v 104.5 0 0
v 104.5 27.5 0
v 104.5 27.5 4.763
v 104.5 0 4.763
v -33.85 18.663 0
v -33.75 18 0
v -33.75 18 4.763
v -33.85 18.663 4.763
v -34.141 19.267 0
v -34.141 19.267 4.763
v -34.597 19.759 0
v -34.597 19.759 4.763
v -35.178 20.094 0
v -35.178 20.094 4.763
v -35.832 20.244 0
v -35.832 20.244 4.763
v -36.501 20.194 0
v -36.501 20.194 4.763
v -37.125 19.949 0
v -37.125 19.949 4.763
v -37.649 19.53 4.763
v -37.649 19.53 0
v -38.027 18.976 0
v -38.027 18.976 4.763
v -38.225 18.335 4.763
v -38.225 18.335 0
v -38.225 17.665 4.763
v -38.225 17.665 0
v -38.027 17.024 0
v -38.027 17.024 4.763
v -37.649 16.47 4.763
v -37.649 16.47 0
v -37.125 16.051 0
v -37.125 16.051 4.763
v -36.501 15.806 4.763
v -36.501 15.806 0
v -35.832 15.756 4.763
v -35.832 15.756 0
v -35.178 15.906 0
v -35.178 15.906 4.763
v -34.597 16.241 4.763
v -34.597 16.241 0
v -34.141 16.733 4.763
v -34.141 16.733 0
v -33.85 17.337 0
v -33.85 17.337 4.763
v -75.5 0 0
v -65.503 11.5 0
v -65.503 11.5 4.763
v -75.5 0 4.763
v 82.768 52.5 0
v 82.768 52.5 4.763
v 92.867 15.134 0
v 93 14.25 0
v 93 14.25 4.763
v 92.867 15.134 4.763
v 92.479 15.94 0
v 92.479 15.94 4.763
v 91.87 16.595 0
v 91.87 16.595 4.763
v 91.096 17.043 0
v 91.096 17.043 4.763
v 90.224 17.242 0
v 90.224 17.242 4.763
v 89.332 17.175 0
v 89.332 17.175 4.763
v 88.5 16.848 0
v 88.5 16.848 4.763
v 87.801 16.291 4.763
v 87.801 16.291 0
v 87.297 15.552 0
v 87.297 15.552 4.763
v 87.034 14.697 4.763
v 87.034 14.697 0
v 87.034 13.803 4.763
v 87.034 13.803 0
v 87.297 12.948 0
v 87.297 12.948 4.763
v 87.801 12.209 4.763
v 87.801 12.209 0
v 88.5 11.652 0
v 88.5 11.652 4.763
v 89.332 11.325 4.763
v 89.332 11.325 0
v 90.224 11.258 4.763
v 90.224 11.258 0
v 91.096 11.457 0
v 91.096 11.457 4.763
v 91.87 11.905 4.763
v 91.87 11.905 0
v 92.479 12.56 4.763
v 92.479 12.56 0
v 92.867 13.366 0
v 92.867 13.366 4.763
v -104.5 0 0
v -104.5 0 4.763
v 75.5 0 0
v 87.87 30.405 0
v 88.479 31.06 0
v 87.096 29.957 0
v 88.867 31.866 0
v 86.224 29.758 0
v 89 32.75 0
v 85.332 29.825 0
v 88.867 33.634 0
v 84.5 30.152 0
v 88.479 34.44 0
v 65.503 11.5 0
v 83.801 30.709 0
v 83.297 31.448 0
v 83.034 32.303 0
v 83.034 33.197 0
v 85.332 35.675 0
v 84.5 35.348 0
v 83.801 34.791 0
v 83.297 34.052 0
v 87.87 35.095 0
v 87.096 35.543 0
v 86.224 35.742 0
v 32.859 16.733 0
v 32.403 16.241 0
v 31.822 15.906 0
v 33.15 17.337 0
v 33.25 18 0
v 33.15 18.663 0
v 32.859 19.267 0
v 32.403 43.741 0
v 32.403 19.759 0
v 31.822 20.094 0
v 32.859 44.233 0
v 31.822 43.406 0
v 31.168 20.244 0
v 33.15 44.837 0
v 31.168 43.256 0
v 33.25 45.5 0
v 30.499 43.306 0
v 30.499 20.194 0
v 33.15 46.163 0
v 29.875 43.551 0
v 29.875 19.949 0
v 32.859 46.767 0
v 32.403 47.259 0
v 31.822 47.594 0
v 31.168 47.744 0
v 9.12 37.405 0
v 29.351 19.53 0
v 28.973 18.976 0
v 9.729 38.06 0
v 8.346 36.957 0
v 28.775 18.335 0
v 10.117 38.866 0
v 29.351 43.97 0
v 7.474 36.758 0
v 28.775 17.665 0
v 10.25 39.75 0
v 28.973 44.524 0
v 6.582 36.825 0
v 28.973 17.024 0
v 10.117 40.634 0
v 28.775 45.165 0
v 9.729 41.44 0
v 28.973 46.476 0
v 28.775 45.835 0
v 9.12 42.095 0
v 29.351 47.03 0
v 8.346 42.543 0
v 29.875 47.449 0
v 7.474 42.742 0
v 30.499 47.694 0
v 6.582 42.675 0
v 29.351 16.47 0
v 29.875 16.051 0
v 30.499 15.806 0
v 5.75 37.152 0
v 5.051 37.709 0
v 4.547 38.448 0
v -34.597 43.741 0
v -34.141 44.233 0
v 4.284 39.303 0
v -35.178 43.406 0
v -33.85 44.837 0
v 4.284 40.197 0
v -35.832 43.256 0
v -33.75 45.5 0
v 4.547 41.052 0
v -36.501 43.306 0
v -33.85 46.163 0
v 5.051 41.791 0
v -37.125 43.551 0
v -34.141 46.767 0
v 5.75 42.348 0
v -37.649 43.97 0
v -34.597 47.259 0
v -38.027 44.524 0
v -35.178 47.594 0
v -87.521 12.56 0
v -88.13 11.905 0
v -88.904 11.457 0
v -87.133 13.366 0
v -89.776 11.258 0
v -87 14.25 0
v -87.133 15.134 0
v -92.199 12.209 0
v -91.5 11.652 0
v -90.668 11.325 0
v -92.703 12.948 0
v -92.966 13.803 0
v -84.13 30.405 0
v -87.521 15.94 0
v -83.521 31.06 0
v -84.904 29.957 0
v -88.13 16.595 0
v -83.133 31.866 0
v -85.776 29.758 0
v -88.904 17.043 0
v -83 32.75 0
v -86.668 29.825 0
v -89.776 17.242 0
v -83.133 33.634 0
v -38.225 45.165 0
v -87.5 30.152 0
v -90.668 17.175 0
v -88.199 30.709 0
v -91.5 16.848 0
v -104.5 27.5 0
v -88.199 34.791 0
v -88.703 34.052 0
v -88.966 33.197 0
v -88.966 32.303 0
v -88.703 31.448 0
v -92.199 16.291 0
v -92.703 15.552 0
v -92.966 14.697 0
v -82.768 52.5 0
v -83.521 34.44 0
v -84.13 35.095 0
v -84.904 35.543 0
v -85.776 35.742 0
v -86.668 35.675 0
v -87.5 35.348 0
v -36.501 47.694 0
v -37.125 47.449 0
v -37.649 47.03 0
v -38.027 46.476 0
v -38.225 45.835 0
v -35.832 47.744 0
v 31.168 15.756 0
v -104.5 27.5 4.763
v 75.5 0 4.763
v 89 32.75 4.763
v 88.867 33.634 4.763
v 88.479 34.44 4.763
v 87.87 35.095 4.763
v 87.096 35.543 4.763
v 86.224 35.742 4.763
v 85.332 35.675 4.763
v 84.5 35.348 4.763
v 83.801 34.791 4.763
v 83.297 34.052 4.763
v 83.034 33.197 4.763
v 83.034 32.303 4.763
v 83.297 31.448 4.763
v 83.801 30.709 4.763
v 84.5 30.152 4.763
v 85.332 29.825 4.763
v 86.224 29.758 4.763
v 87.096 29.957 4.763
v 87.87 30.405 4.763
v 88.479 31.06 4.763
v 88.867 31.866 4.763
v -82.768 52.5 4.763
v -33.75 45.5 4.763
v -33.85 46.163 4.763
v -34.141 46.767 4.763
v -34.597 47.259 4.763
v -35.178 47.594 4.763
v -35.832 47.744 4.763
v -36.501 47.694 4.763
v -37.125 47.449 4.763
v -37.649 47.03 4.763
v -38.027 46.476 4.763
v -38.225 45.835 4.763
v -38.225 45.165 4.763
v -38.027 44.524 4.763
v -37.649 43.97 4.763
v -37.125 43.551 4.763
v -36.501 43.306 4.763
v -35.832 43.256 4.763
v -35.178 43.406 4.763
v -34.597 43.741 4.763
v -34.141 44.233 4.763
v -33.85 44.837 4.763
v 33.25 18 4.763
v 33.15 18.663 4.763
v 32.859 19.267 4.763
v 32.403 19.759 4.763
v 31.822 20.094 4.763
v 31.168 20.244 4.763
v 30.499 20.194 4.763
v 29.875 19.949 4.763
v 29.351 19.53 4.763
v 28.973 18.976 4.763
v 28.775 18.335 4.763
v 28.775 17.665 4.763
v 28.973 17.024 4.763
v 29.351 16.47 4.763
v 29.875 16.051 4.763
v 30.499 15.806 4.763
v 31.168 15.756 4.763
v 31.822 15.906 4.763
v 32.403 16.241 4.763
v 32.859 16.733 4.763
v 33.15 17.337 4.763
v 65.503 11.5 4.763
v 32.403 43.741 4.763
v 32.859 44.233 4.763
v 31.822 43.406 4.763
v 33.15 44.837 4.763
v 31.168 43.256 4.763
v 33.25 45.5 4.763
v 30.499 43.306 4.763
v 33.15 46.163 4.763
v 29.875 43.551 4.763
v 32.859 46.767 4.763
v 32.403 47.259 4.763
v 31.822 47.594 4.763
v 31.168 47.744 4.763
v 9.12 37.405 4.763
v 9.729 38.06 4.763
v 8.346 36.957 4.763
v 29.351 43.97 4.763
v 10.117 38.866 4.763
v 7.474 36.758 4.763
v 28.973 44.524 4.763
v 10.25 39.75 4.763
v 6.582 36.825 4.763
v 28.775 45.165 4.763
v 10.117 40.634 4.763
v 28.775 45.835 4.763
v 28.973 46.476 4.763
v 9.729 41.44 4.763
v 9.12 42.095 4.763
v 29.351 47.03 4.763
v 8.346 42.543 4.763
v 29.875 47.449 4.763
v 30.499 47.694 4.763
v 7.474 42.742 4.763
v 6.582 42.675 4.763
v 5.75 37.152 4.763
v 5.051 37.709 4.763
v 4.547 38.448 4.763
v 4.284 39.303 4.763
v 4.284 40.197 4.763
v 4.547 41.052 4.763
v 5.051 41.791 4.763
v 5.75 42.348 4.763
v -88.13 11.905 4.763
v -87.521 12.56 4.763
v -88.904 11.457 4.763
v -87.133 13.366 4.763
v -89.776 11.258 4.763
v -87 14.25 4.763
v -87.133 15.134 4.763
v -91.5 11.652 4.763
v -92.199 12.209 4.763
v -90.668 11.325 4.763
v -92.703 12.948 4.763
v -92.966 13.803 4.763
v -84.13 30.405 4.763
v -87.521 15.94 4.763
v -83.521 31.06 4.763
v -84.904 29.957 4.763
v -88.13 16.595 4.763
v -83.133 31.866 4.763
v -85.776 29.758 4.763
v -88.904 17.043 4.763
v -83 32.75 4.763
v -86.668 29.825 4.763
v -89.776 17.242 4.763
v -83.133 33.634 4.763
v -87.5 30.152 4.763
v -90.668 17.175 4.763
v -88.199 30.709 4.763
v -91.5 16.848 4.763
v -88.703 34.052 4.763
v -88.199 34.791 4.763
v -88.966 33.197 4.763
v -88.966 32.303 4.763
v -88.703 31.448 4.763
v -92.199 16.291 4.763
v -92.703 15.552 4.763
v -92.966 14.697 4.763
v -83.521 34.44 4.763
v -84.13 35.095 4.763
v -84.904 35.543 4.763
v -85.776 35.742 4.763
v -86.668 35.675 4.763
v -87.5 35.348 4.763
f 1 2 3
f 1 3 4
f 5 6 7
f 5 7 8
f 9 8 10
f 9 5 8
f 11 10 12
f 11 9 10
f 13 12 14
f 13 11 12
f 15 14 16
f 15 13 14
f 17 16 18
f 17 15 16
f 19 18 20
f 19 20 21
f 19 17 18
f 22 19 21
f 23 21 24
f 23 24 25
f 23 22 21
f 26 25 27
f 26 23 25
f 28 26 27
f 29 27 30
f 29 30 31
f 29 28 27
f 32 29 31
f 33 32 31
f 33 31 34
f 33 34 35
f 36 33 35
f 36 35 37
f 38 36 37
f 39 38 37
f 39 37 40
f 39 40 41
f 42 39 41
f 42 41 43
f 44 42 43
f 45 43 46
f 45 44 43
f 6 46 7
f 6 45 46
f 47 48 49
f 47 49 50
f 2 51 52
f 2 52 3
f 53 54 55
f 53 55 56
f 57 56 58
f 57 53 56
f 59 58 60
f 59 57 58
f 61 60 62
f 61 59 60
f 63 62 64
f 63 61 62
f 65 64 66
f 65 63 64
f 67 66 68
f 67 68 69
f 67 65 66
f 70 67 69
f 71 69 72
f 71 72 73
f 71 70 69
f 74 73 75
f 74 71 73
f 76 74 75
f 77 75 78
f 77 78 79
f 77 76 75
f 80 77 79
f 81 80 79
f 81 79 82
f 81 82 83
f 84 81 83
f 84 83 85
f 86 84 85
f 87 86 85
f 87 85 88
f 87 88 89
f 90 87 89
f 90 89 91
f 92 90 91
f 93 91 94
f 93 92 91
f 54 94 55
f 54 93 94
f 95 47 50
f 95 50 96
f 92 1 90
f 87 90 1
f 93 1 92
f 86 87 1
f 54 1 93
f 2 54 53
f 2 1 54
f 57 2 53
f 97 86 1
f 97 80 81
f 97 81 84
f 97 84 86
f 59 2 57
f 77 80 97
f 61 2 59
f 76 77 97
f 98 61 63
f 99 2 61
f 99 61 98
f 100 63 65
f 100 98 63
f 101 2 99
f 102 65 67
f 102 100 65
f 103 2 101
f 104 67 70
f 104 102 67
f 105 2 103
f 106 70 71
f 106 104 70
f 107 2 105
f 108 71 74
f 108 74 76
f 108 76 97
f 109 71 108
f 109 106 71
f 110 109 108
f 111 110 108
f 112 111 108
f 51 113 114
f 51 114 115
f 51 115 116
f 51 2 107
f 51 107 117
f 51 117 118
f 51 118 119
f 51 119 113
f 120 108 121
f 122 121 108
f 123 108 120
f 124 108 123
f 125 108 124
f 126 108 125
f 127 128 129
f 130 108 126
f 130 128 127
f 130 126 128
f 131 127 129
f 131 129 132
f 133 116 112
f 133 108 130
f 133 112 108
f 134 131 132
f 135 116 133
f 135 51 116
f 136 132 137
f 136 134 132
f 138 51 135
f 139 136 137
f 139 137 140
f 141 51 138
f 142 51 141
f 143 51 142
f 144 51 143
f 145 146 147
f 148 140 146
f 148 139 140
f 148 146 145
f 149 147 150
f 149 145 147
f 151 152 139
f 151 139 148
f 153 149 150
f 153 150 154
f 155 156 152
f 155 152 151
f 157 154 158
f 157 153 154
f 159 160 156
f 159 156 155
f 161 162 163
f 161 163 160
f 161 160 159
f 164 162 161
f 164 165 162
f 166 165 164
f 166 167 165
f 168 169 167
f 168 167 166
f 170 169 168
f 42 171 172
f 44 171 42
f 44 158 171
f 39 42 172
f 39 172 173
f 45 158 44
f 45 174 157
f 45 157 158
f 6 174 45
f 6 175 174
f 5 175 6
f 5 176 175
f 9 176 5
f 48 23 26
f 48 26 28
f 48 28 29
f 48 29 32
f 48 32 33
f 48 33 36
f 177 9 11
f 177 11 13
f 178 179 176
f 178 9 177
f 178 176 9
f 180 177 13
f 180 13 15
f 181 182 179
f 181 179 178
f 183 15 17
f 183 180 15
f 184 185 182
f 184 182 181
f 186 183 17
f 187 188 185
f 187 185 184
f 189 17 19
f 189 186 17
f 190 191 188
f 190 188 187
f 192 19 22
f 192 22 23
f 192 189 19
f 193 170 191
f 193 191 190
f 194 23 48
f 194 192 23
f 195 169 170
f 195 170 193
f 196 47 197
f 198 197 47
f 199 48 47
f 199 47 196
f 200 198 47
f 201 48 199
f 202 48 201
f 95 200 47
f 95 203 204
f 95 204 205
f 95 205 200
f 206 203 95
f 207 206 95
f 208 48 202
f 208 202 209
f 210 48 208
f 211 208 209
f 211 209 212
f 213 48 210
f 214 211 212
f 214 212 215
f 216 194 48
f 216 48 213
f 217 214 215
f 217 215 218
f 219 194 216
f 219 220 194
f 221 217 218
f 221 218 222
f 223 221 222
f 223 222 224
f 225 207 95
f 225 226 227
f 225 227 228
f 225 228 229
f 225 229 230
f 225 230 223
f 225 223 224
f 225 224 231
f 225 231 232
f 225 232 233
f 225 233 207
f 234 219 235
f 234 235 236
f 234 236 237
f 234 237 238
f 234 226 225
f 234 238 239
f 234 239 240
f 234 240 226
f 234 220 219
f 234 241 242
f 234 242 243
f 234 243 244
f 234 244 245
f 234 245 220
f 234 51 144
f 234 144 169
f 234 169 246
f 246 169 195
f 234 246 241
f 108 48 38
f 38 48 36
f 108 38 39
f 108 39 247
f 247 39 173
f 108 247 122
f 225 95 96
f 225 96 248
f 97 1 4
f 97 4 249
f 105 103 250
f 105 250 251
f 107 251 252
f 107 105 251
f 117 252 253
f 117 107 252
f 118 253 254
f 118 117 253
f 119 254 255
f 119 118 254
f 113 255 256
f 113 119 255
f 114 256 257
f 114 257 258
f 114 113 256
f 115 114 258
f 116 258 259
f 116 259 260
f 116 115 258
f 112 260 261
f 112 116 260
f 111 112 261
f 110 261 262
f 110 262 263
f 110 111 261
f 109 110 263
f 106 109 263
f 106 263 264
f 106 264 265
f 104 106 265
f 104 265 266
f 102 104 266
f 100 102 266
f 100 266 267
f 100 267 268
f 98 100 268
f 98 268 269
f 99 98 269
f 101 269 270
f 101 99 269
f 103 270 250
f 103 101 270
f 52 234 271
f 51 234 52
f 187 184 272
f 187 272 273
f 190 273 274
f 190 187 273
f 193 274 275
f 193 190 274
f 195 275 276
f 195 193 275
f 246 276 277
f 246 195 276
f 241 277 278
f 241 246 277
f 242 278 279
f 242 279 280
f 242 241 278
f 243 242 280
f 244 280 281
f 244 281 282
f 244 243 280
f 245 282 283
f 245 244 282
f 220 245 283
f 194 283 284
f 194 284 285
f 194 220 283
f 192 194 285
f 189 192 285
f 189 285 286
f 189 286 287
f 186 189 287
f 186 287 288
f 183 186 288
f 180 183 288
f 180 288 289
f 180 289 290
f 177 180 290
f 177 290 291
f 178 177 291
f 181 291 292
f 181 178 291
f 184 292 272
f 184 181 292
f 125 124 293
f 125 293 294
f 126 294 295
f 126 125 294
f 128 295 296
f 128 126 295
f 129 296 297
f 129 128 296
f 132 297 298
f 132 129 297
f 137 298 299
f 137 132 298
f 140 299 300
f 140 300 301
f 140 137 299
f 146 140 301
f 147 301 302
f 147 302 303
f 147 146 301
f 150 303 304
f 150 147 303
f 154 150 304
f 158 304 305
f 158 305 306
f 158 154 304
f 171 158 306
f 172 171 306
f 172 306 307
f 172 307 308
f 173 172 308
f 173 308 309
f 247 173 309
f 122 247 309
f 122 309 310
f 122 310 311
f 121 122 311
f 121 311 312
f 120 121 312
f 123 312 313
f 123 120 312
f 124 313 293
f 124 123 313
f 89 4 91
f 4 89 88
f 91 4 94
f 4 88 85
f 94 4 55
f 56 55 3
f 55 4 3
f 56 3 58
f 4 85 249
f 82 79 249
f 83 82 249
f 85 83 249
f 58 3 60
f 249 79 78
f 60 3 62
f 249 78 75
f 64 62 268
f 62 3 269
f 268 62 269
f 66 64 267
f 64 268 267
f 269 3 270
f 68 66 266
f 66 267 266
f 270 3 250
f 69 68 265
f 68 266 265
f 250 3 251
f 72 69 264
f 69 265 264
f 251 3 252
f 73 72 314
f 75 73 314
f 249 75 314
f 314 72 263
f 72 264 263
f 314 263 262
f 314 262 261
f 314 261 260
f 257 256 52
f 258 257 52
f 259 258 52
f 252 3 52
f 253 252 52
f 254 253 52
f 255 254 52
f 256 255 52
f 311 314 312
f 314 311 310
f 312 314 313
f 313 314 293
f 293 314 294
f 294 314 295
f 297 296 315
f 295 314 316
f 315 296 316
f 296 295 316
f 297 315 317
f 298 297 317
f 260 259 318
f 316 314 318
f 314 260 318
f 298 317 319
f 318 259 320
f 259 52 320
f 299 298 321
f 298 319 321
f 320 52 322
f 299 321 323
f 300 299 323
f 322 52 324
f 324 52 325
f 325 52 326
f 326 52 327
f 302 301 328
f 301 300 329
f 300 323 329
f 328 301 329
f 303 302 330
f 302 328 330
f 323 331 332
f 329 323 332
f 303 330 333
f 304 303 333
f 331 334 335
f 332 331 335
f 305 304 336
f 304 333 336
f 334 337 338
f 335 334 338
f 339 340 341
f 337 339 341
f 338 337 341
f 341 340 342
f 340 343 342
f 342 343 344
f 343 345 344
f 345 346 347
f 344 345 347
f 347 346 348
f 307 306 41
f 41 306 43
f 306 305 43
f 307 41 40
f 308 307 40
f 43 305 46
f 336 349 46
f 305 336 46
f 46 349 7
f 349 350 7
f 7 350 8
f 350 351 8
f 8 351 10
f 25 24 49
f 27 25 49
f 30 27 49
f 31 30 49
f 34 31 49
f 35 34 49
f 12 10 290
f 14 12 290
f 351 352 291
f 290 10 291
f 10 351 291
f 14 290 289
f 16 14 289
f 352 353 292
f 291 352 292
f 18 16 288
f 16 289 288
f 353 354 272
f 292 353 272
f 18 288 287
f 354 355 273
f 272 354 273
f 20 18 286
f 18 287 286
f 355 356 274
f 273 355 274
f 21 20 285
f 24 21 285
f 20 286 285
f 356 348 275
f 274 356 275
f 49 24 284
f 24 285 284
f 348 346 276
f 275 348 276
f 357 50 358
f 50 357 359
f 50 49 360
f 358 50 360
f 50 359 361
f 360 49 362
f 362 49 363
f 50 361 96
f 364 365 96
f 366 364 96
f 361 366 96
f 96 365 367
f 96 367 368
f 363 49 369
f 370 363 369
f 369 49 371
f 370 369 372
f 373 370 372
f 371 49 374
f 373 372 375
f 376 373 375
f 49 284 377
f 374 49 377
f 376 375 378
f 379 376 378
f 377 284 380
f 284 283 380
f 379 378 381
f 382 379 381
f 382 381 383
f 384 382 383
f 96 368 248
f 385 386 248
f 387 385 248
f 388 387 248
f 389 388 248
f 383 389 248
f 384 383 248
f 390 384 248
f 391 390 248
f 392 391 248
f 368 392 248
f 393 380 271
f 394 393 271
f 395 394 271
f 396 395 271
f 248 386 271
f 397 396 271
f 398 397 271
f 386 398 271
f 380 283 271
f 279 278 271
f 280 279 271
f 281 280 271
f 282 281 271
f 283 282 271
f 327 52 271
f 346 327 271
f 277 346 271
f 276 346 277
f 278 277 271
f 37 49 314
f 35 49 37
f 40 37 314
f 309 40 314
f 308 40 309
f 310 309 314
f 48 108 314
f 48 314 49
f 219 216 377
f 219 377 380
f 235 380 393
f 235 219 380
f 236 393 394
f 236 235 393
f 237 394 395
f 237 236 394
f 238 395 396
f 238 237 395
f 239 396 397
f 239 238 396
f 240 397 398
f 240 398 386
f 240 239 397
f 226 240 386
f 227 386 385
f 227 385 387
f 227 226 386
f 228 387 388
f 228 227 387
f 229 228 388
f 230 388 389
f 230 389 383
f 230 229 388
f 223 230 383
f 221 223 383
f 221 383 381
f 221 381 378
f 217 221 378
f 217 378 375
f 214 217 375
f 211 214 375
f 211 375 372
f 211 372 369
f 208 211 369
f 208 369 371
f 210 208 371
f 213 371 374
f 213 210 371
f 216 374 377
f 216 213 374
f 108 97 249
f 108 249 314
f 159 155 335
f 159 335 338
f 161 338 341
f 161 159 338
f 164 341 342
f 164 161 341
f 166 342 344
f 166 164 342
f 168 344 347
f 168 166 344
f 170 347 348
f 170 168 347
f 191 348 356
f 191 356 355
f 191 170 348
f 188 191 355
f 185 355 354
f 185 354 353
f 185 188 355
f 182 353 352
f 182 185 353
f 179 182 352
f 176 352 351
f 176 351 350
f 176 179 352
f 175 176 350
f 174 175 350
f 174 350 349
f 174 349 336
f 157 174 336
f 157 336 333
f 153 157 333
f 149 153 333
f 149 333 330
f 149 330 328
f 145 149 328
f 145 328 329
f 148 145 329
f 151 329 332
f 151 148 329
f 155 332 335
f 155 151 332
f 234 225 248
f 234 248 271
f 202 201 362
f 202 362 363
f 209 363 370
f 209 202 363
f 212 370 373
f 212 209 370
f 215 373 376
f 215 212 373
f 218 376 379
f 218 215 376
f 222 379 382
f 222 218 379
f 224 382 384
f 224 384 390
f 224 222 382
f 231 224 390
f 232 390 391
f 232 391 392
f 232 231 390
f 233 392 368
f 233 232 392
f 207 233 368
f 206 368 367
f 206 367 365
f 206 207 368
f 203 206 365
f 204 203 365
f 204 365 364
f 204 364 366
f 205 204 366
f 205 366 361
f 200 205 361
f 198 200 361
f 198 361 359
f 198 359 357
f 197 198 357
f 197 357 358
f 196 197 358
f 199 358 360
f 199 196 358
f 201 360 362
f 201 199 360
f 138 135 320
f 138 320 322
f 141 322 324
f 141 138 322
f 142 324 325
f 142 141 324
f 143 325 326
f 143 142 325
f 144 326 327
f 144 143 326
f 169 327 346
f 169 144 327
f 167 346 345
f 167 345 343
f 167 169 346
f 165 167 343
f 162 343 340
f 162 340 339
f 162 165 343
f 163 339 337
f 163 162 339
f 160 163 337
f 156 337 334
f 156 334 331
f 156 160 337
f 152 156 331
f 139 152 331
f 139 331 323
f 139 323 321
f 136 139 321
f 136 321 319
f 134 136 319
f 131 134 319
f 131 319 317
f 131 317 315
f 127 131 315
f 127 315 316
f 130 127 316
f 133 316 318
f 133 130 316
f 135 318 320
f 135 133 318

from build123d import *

# Parameters (mm, degrees)
SKETCH_R   = 3
SKETCH_R_2 = 2.25
PAD_DEPTH  = 4.763


with BuildPart() as part:
    # Sketch → Pad (new body)
    with BuildSketch(Plane.XY):
        Polygon((-104.5, 0), (-104.5, 27.5), (-82.767832, 52.5), (82.767832, 52.5), (104.5, 27.5), (104.5, 0), (75.5, 0), (65.503203, 11.5), (-65.503203, 11.5), (-75.5, 0), align=None)
        with Locations((7.25, 39.75)):
            Circle(SKETCH_R, mode=Mode.SUBTRACT)
        with Locations((86, 32.75)):
            Circle(SKETCH_R, mode=Mode.SUBTRACT)
        with Locations((90, 14.25)):
            Circle(SKETCH_R, mode=Mode.SUBTRACT)
        with Locations((-90, 14.25)):
            Circle(SKETCH_R, mode=Mode.SUBTRACT)
        with Locations((-86, 32.75)):
            Circle(SKETCH_R, mode=Mode.SUBTRACT)
        with Locations((-36, 45.5)):
            Circle(SKETCH_R_2, mode=Mode.SUBTRACT)
        with Locations((-36, 18)):
            Circle(SKETCH_R_2, mode=Mode.SUBTRACT)
        with Locations((31, 18)):
            Circle(SKETCH_R_2, mode=Mode.SUBTRACT)
        with Locations((31, 45.5)):
            Circle(SKETCH_R_2, mode=Mode.SUBTRACT)
    extrude(amount=PAD_DEPTH)


solid = part.part
